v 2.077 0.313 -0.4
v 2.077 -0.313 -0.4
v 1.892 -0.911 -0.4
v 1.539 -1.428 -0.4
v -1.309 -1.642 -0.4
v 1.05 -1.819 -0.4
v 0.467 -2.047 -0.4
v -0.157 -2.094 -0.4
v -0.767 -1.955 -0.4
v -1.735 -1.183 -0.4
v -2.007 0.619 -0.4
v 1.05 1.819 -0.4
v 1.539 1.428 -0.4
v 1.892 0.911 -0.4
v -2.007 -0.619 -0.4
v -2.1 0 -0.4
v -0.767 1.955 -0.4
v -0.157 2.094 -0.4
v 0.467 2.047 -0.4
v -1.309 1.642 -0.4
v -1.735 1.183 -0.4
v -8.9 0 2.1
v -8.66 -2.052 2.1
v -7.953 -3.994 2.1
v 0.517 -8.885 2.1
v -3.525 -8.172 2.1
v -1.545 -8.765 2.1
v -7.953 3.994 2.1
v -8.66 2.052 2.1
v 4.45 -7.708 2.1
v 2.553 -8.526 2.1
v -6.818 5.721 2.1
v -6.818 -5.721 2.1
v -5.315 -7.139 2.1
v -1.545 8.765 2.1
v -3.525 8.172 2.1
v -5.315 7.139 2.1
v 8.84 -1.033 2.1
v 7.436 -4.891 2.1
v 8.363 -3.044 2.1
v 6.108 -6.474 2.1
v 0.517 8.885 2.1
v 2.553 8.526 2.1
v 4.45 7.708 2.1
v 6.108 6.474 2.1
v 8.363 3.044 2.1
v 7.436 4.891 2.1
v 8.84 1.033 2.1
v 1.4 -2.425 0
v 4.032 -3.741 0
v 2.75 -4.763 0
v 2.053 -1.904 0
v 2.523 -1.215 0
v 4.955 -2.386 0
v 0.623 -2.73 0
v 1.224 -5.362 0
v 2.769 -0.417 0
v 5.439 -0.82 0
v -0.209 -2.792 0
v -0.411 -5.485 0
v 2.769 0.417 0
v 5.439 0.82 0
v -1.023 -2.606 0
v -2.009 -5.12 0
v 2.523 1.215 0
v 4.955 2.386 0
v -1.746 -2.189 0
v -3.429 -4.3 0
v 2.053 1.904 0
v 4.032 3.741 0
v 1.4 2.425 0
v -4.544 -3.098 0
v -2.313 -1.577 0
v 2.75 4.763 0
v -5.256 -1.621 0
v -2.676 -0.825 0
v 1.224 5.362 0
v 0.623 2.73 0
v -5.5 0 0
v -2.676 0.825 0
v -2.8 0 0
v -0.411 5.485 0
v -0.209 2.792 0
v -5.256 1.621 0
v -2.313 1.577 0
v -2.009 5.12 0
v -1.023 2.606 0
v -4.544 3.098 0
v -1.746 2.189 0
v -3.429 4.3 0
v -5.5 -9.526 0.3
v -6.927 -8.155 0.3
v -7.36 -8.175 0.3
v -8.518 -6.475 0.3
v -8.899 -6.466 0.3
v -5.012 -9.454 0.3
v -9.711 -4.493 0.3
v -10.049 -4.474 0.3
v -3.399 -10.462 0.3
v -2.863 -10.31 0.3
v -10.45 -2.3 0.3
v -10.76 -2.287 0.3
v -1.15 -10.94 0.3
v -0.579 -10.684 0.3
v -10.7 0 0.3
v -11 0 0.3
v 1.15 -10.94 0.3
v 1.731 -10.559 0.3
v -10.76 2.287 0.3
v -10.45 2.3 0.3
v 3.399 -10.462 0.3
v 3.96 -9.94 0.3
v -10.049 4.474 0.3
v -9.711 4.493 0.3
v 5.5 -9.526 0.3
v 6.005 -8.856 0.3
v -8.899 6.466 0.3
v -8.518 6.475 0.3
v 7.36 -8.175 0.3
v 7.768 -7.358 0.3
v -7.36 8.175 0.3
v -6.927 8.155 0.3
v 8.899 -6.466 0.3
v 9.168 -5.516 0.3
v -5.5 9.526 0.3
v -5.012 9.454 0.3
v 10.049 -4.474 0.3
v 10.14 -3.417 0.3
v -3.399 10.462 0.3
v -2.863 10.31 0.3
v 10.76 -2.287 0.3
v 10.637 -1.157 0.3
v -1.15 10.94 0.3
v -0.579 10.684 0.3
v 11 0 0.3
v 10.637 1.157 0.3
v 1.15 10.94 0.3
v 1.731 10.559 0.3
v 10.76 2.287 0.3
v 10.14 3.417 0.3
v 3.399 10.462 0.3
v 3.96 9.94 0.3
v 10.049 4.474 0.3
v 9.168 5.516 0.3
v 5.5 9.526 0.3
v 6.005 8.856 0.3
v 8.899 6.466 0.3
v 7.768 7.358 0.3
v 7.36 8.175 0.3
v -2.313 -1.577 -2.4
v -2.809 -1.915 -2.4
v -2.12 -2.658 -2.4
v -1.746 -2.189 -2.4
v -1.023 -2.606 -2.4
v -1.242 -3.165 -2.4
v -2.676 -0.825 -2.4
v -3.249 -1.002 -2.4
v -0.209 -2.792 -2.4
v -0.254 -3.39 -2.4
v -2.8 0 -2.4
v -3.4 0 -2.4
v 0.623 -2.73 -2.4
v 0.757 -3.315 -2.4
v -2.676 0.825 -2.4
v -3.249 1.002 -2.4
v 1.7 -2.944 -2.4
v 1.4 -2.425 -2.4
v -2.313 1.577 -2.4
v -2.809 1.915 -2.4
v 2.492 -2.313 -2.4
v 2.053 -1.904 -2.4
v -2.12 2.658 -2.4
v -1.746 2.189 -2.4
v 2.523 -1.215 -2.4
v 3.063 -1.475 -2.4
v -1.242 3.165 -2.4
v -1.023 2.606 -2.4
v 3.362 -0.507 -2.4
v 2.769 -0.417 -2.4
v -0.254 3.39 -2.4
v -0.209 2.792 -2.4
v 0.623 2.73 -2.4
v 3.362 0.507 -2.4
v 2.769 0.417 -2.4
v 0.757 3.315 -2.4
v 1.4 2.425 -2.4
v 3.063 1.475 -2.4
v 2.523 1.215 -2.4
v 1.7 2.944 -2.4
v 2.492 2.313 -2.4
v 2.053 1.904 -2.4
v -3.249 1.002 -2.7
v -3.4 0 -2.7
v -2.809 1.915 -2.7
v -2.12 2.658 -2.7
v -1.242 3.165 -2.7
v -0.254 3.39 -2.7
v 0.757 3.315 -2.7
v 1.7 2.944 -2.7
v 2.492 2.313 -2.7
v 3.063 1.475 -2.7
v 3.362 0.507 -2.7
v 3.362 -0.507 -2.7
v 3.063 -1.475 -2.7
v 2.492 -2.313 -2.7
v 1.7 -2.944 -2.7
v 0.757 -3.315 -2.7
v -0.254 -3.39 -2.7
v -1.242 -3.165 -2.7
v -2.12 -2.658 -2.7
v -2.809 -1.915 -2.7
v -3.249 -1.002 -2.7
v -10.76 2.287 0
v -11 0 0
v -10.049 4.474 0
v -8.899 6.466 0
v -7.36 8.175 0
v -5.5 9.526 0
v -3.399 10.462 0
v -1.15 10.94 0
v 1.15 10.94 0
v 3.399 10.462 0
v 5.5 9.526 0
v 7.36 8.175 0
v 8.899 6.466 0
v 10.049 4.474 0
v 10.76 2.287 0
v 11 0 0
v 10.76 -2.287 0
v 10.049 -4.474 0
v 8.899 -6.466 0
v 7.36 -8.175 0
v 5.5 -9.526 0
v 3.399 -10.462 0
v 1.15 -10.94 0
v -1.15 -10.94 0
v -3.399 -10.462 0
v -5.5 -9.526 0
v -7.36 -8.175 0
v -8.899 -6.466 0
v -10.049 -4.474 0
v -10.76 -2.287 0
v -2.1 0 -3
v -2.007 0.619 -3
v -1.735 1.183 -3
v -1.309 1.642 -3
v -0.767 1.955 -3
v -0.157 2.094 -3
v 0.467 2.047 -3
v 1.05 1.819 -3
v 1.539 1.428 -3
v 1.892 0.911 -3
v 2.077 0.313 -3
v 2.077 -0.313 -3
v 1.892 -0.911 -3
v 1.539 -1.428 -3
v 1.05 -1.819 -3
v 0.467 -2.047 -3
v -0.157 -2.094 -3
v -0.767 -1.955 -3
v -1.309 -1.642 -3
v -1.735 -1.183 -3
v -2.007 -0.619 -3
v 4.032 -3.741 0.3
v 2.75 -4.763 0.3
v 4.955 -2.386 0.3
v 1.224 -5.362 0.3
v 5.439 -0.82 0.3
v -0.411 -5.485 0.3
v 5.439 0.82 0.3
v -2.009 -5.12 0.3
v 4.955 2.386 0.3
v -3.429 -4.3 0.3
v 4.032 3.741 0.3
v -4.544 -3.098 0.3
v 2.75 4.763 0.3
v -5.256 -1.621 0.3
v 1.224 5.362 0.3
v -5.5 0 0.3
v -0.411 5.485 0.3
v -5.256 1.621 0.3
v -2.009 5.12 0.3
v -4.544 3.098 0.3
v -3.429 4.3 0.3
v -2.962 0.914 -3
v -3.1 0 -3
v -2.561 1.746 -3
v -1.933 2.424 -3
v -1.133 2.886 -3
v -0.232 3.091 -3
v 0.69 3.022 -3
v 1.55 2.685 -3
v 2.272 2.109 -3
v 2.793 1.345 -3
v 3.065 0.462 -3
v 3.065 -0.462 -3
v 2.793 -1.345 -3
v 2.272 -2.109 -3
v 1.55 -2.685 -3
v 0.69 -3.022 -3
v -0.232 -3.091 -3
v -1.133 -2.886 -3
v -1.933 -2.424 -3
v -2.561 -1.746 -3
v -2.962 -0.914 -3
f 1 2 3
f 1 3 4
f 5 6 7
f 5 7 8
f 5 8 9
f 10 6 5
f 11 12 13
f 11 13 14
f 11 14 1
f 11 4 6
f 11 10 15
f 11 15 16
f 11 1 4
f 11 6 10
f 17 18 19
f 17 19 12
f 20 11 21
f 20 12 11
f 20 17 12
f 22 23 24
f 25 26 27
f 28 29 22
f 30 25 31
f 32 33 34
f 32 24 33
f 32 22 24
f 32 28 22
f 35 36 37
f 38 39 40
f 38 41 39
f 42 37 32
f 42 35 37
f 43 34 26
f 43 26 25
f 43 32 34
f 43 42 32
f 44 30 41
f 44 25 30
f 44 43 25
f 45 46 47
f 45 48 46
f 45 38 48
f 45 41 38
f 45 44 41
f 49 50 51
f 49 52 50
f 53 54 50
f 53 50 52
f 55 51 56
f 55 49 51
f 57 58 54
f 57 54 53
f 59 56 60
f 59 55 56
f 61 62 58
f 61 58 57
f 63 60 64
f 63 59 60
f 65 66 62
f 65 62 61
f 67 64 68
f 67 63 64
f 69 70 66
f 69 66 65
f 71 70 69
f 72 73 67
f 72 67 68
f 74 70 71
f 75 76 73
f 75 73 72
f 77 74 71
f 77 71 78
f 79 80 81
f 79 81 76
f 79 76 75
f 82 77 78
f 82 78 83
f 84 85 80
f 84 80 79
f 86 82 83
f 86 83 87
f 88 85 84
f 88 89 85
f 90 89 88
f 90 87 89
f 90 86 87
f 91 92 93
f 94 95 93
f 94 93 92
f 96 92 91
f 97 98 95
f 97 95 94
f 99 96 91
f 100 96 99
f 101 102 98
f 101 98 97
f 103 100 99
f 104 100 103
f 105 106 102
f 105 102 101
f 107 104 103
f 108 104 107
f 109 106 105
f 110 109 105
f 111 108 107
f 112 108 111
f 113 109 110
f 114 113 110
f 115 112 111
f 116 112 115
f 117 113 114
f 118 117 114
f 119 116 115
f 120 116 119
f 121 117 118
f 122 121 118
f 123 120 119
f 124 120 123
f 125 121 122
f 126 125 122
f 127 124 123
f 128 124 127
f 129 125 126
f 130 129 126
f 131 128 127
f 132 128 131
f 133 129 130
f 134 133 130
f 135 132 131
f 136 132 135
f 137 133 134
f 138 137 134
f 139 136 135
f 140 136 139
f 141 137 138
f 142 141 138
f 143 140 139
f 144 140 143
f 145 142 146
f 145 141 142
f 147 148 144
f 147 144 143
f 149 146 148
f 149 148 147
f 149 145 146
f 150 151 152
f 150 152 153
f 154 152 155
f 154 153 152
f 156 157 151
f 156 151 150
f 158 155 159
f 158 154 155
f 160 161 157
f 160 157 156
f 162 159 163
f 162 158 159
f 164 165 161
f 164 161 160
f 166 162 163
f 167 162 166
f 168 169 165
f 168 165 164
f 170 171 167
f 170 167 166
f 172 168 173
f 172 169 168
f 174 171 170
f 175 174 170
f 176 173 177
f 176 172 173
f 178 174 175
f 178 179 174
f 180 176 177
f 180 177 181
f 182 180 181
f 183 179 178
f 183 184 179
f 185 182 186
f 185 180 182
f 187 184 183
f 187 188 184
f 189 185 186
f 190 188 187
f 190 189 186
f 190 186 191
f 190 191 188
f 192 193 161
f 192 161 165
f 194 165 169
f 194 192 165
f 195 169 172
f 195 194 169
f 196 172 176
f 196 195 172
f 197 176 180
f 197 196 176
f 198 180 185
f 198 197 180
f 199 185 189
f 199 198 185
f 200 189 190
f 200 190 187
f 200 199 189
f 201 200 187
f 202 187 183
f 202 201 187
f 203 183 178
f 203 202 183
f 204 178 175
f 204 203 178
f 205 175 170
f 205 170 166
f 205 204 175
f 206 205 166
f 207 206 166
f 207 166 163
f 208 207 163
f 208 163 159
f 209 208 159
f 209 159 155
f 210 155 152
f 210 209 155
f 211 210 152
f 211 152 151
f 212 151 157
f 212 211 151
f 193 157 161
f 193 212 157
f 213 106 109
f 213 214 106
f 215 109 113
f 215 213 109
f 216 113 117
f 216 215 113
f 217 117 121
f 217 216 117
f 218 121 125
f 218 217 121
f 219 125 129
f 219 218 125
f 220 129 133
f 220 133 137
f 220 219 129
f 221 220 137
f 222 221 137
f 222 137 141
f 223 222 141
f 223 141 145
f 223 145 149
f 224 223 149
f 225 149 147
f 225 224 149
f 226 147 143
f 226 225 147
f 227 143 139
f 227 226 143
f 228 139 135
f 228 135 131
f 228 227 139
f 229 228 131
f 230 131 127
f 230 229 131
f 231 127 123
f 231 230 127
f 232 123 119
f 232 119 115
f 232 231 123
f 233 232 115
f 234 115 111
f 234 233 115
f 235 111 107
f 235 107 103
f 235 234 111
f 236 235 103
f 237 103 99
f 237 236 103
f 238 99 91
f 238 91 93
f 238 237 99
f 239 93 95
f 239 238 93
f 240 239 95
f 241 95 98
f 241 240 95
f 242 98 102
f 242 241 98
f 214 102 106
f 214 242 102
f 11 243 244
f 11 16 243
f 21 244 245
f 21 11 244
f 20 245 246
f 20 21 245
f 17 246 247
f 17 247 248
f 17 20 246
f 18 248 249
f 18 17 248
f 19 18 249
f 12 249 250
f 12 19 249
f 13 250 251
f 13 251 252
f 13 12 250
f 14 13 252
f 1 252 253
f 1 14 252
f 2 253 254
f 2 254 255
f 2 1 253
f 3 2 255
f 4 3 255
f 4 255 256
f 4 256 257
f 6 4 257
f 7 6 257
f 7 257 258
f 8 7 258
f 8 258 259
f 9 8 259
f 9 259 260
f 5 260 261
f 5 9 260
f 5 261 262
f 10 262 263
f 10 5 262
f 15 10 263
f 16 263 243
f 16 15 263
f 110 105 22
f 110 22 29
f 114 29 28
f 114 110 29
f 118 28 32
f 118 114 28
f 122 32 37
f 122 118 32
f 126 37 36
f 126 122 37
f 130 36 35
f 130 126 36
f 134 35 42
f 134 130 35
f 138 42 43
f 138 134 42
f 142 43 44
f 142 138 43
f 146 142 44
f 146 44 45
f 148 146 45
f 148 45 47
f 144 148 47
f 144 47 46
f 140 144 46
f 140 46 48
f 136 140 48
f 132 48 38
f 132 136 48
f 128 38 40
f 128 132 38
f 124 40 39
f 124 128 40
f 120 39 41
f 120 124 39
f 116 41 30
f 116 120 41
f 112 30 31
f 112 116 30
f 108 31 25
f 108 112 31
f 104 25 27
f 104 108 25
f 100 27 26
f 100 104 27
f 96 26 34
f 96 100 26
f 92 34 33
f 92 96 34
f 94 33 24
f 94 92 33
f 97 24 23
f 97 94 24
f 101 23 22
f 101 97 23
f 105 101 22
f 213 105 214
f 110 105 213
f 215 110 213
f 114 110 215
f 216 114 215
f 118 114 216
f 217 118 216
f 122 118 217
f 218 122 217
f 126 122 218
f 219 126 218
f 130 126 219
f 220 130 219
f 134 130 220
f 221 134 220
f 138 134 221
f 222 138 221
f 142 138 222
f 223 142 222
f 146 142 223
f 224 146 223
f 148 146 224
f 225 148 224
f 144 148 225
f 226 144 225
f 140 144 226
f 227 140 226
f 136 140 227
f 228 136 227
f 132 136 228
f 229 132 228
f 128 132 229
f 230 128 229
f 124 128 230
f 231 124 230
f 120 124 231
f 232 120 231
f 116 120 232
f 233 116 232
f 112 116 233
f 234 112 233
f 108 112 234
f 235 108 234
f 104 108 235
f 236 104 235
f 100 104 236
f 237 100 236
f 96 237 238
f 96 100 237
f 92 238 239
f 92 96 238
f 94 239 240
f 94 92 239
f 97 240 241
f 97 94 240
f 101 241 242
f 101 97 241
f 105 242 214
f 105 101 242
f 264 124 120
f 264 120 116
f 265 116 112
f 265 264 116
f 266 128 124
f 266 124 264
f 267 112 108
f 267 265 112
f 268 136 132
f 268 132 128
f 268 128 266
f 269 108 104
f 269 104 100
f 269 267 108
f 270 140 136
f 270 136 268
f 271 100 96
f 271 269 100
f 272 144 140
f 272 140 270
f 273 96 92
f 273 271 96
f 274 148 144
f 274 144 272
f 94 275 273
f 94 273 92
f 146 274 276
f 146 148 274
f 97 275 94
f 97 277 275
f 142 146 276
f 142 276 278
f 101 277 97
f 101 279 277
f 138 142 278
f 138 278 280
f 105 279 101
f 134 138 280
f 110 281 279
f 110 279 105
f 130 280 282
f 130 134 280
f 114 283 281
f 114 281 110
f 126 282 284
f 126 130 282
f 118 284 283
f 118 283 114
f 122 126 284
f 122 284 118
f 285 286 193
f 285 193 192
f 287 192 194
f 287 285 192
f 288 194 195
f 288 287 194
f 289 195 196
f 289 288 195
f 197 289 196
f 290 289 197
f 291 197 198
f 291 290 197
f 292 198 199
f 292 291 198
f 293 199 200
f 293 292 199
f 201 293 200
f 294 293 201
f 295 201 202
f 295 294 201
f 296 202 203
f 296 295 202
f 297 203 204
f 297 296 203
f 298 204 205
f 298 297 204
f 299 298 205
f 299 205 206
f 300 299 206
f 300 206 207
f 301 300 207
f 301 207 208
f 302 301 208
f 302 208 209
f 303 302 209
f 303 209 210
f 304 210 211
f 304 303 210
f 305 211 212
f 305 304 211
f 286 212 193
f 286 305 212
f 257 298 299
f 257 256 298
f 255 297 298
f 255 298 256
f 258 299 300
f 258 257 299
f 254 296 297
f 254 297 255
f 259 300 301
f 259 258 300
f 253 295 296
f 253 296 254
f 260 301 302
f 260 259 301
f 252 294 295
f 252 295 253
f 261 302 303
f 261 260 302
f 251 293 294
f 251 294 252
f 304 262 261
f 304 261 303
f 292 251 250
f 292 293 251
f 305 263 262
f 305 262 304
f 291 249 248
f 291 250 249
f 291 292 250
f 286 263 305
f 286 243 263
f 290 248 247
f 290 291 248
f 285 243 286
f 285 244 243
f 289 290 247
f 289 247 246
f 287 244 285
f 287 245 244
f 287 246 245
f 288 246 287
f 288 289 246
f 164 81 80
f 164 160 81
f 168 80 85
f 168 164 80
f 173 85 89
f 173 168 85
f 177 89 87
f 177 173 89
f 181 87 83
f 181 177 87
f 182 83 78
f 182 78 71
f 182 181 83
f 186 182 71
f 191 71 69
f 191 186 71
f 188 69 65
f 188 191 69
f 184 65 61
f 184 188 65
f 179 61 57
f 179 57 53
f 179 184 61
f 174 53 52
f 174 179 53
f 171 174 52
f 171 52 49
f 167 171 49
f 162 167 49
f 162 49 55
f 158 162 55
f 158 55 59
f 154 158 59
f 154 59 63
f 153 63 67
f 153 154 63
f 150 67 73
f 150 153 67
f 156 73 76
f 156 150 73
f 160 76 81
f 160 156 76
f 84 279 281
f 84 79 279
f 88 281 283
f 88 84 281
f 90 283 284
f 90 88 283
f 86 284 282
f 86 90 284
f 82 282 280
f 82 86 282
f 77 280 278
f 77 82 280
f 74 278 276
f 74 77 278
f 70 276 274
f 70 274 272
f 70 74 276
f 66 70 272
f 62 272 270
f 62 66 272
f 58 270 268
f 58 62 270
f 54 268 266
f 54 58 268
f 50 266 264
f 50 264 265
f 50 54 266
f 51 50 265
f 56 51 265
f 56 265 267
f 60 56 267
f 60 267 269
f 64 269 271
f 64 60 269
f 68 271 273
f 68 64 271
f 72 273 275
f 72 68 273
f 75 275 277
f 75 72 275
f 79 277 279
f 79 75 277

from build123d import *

# Parameters (mm, degrees)
F2_SIZE = 0.3


with BuildPart() as f1:
    # F0 (on Front) → F1 (revolve)
    with BuildSketch(Plane.XZ):
        Polygon((-11, 0), (-10.7, 0.3), (-11, 0.3), align=None)
        Polygon((-5.5, 0), (-2.8, 0), (-2.8, -2.4), (-3.4, -2.4), (-3.4, -3), (-2.1, -3), (-2.1, -0.4), (0, -0.4), (0, 2.1), (-8.9, 2.1), (-10.7, 0.3), (-5.5, 0.3), align=None)
    revolve(axis=Axis((0, 0, -0.4979), (0, 0, -1)))

    # F2
    f2_edges = [f1.edges().sort_by_distance(p)[0] for p in [
        (3.4, 0, -3),
    ]]
    chamfer(f2_edges, length=F2_SIZE)


solid = f1.part
